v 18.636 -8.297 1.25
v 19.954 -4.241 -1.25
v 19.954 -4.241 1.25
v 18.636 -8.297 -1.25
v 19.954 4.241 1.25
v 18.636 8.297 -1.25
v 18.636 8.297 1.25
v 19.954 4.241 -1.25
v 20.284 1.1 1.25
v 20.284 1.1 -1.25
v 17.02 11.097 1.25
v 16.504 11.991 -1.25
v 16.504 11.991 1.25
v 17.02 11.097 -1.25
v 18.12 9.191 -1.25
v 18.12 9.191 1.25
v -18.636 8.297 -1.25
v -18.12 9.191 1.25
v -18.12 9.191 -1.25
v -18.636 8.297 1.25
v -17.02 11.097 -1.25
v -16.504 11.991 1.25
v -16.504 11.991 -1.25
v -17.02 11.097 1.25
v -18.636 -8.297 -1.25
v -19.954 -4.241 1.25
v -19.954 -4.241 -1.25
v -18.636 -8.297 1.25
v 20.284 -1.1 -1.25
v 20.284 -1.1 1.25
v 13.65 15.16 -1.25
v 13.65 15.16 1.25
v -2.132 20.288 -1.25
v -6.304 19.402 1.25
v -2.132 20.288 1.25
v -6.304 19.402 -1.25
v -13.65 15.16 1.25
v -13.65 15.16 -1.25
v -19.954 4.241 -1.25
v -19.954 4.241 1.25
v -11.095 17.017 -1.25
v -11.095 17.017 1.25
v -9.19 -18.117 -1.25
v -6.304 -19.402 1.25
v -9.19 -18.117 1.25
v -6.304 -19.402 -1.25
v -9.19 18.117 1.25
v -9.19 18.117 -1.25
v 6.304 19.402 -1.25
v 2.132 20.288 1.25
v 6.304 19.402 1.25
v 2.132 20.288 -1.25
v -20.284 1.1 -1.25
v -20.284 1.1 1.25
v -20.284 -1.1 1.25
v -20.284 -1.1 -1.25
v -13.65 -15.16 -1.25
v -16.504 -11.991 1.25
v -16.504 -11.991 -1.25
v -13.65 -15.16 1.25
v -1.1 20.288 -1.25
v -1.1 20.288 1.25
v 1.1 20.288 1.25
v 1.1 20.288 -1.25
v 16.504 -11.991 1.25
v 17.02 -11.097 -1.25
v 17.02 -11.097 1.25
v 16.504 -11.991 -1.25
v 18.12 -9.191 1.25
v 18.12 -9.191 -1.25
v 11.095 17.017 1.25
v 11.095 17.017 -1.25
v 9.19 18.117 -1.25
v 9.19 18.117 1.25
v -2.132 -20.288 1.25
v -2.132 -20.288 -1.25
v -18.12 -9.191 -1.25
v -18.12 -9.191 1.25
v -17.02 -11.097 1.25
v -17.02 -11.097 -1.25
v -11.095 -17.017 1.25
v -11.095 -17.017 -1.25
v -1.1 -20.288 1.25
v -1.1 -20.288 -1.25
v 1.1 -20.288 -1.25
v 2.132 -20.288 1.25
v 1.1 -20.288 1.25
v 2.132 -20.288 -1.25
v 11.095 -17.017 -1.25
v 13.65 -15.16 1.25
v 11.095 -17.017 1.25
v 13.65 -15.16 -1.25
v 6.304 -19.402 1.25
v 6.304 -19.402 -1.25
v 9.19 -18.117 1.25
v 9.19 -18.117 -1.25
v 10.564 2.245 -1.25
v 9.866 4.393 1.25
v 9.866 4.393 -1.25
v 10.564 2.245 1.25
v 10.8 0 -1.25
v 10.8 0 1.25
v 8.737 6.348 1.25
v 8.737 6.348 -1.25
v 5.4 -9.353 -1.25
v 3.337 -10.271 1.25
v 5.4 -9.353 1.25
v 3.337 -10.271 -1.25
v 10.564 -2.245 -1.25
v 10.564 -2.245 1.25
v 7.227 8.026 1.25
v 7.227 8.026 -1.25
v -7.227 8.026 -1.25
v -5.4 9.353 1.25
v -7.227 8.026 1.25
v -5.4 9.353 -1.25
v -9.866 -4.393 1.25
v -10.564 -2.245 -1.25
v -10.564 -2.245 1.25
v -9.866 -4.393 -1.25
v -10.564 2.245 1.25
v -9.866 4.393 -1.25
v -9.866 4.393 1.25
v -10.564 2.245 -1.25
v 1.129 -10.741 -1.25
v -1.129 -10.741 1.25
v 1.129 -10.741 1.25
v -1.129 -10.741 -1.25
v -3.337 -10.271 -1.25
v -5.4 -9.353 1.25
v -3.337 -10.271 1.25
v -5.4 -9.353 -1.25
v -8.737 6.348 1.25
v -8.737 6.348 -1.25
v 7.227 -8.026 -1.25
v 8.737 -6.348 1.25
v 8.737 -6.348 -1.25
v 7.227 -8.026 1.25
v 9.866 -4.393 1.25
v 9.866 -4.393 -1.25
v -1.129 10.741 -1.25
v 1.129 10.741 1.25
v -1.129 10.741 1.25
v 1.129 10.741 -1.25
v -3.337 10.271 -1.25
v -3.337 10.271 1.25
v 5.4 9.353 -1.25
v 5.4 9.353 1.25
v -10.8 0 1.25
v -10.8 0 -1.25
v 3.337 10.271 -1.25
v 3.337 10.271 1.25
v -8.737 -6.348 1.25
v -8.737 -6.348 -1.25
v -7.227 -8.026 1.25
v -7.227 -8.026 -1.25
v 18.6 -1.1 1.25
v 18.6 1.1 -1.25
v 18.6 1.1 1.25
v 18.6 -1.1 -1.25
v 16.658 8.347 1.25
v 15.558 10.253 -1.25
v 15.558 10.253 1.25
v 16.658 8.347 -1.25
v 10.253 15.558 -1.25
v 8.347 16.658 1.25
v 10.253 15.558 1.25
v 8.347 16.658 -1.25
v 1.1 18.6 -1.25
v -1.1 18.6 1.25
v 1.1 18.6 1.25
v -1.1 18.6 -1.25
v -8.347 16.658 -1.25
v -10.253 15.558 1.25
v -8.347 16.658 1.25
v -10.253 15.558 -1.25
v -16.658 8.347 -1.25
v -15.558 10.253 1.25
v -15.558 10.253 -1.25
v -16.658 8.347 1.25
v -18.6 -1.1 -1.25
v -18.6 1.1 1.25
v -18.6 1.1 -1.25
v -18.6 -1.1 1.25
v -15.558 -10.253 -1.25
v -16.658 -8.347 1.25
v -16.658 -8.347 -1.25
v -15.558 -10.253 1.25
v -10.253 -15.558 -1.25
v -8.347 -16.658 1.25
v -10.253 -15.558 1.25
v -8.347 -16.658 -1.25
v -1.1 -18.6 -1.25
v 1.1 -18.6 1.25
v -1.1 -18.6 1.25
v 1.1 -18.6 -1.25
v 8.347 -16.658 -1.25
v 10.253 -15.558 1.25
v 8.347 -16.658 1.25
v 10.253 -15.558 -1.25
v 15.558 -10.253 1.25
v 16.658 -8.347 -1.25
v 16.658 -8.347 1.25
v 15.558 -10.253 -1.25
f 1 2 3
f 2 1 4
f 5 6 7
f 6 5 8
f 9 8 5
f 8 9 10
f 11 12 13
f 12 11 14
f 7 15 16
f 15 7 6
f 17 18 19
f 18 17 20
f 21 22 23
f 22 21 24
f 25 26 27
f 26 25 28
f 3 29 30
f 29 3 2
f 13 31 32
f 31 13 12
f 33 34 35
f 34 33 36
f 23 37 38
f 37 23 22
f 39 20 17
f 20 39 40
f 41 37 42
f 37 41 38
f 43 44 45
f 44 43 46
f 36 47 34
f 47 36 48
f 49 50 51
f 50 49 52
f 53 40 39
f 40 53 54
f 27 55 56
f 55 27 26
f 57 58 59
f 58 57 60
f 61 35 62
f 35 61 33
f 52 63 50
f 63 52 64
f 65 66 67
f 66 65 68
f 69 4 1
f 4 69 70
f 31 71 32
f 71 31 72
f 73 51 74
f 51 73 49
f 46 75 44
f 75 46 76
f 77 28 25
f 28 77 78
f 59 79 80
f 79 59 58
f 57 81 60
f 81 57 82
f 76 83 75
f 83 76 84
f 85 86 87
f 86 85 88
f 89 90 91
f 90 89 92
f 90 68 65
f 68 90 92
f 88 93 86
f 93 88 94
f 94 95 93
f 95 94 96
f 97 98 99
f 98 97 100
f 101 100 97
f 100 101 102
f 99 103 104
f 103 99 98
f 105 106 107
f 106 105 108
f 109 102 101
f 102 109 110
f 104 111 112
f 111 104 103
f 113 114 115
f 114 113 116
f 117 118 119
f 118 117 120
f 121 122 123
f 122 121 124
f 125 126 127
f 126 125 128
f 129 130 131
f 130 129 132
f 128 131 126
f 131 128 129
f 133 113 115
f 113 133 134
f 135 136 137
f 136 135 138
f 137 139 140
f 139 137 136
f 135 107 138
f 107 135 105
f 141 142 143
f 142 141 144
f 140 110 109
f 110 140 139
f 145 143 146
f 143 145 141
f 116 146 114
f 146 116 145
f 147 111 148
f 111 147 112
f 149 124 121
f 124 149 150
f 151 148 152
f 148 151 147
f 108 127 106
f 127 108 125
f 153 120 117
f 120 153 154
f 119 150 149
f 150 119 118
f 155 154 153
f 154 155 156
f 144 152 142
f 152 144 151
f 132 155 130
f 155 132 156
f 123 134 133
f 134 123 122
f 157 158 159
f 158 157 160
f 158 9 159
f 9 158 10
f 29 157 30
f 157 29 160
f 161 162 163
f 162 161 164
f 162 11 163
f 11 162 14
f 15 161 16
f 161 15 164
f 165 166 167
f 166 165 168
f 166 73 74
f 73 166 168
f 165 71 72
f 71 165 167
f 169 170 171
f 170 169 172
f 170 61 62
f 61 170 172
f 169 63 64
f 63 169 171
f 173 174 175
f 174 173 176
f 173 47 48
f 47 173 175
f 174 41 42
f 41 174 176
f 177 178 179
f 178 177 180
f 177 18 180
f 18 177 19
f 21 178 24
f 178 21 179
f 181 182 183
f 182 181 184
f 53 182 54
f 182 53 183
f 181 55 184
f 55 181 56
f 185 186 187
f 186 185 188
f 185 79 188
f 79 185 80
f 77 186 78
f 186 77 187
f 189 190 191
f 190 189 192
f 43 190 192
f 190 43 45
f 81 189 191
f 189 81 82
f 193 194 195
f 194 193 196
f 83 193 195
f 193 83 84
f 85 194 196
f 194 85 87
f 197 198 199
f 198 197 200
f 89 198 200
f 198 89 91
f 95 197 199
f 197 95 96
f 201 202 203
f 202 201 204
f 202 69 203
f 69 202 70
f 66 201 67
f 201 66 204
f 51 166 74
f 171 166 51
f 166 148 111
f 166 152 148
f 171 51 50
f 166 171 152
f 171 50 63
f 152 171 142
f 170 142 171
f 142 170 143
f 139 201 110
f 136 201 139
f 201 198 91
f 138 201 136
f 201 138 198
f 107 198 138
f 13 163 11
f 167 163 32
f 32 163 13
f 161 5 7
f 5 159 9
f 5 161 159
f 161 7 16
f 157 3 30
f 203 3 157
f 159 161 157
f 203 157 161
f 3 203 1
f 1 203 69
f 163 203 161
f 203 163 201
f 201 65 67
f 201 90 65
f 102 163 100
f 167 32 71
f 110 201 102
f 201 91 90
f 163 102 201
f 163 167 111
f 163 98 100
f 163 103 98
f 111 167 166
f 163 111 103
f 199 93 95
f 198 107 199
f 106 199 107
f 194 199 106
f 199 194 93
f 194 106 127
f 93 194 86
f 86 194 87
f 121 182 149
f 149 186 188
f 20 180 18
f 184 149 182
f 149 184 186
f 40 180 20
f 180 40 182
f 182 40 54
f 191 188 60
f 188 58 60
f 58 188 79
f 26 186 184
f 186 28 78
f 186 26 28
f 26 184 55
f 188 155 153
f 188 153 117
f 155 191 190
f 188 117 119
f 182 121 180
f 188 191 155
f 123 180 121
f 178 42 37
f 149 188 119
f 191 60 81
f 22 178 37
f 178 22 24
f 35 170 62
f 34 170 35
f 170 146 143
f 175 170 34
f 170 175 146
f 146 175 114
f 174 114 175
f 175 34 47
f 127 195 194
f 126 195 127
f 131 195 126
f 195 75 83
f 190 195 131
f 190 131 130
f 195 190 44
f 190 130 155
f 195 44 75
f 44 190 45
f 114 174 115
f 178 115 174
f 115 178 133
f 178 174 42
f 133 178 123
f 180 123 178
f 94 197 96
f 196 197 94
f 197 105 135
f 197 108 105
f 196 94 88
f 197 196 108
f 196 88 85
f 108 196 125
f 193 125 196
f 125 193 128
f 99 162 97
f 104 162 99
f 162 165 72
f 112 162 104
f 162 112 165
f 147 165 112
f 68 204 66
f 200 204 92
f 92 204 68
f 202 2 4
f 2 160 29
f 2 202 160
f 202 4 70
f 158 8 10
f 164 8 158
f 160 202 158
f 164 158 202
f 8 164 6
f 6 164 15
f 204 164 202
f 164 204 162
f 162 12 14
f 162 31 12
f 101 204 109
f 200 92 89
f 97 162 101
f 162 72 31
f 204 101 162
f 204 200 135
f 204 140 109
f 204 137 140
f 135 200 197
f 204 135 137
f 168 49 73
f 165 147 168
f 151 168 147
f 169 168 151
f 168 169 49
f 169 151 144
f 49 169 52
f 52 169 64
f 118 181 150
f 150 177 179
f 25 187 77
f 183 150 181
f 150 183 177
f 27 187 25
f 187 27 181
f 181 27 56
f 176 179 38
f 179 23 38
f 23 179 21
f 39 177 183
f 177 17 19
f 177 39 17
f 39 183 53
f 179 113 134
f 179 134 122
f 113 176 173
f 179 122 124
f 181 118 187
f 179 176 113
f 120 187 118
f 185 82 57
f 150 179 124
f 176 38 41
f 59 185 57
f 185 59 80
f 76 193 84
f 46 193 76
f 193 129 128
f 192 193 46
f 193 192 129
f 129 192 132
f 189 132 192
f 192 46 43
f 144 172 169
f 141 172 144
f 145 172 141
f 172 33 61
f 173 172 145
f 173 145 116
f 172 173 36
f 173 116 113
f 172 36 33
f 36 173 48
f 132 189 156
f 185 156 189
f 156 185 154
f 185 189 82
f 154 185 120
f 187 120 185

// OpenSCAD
// Parameters
outer_radius = 20.4; //[10.2:40.8:0.1]
inner_radius = 10.8; //[5.4:21.6:0.1]
height = 5.3; //[2.65:10.6:0.1]
count_or_scale = 1; //[1:4:1]
overlap = 0.8; //[0.5:2:0.1]
chamfer_depth = 0.8; //[0.4:1.6:0.1]
chamfer_height = 0.6; //[0.3:1.2:0.1]
base_pattern_count = 12; //[6:24:1]
groove_width = 2.2; //[1.1:4.4:0.1]
groove_depth = 1.0; //[0.5:2:0.1]

// Main radial body
module radial_main_body() {
  color("Silver")
  cylinder(r=outer_radius, h=height, center=true);
}

// Inner bore
module inner_bore() {
  color("Black")
  cylinder(r=inner_radius, h=height + 2*overlap, center=true);
}

// Chamfer top outer
module fillet_chamfer_top_outer() {
  color("DimGray")
  translate([0, 0, height/2 - (chamfer_height + overlap)/2])
    cylinder(r1=outer_radius + overlap, r2=outer_radius + overlap - chamfer_depth, h=chamfer_height + overlap, center=true);
}

// Chamfer bottom outer
module fillet_chamfer_bottom_outer() {
  color("DimGray")
  translate([0, 0, -height/2 + (chamfer_height + overlap)/2])
    rotate([180, 0, 0])
    cylinder(r1=outer_radius + overlap, r2=outer_radius + overlap - chamfer_depth, h=chamfer_height + overlap, center=true);
}

// Groove cutter base
module groove_cutter_base() {
  color("Black")
  translate([outer_radius - groove_depth/2, 0, 0])
    cube([groove_depth + 2*overlap, groove_width, height + 2*overlap], center=true);
}

// Assemble the radial body with chamfers and grooves
module final_model() {
  difference() {
    // Main body minus inner bore
    difference() {
      radial_main_body();
      inner_bore();
    }
    // Subtract chamfers
    fillet_chamfer_top_outer();
    fillet_chamfer_bottom_outer();
    // Subtract groove pattern
    union() {
      for (i = [0:base_pattern_count*count_or_scale-1]) {
        rotate([0, 0, i*(360/(base_pattern_count*count_or_scale))])
          groove_cutter_base();
      }
    }
  }
}

// Render the final model
final_model();
